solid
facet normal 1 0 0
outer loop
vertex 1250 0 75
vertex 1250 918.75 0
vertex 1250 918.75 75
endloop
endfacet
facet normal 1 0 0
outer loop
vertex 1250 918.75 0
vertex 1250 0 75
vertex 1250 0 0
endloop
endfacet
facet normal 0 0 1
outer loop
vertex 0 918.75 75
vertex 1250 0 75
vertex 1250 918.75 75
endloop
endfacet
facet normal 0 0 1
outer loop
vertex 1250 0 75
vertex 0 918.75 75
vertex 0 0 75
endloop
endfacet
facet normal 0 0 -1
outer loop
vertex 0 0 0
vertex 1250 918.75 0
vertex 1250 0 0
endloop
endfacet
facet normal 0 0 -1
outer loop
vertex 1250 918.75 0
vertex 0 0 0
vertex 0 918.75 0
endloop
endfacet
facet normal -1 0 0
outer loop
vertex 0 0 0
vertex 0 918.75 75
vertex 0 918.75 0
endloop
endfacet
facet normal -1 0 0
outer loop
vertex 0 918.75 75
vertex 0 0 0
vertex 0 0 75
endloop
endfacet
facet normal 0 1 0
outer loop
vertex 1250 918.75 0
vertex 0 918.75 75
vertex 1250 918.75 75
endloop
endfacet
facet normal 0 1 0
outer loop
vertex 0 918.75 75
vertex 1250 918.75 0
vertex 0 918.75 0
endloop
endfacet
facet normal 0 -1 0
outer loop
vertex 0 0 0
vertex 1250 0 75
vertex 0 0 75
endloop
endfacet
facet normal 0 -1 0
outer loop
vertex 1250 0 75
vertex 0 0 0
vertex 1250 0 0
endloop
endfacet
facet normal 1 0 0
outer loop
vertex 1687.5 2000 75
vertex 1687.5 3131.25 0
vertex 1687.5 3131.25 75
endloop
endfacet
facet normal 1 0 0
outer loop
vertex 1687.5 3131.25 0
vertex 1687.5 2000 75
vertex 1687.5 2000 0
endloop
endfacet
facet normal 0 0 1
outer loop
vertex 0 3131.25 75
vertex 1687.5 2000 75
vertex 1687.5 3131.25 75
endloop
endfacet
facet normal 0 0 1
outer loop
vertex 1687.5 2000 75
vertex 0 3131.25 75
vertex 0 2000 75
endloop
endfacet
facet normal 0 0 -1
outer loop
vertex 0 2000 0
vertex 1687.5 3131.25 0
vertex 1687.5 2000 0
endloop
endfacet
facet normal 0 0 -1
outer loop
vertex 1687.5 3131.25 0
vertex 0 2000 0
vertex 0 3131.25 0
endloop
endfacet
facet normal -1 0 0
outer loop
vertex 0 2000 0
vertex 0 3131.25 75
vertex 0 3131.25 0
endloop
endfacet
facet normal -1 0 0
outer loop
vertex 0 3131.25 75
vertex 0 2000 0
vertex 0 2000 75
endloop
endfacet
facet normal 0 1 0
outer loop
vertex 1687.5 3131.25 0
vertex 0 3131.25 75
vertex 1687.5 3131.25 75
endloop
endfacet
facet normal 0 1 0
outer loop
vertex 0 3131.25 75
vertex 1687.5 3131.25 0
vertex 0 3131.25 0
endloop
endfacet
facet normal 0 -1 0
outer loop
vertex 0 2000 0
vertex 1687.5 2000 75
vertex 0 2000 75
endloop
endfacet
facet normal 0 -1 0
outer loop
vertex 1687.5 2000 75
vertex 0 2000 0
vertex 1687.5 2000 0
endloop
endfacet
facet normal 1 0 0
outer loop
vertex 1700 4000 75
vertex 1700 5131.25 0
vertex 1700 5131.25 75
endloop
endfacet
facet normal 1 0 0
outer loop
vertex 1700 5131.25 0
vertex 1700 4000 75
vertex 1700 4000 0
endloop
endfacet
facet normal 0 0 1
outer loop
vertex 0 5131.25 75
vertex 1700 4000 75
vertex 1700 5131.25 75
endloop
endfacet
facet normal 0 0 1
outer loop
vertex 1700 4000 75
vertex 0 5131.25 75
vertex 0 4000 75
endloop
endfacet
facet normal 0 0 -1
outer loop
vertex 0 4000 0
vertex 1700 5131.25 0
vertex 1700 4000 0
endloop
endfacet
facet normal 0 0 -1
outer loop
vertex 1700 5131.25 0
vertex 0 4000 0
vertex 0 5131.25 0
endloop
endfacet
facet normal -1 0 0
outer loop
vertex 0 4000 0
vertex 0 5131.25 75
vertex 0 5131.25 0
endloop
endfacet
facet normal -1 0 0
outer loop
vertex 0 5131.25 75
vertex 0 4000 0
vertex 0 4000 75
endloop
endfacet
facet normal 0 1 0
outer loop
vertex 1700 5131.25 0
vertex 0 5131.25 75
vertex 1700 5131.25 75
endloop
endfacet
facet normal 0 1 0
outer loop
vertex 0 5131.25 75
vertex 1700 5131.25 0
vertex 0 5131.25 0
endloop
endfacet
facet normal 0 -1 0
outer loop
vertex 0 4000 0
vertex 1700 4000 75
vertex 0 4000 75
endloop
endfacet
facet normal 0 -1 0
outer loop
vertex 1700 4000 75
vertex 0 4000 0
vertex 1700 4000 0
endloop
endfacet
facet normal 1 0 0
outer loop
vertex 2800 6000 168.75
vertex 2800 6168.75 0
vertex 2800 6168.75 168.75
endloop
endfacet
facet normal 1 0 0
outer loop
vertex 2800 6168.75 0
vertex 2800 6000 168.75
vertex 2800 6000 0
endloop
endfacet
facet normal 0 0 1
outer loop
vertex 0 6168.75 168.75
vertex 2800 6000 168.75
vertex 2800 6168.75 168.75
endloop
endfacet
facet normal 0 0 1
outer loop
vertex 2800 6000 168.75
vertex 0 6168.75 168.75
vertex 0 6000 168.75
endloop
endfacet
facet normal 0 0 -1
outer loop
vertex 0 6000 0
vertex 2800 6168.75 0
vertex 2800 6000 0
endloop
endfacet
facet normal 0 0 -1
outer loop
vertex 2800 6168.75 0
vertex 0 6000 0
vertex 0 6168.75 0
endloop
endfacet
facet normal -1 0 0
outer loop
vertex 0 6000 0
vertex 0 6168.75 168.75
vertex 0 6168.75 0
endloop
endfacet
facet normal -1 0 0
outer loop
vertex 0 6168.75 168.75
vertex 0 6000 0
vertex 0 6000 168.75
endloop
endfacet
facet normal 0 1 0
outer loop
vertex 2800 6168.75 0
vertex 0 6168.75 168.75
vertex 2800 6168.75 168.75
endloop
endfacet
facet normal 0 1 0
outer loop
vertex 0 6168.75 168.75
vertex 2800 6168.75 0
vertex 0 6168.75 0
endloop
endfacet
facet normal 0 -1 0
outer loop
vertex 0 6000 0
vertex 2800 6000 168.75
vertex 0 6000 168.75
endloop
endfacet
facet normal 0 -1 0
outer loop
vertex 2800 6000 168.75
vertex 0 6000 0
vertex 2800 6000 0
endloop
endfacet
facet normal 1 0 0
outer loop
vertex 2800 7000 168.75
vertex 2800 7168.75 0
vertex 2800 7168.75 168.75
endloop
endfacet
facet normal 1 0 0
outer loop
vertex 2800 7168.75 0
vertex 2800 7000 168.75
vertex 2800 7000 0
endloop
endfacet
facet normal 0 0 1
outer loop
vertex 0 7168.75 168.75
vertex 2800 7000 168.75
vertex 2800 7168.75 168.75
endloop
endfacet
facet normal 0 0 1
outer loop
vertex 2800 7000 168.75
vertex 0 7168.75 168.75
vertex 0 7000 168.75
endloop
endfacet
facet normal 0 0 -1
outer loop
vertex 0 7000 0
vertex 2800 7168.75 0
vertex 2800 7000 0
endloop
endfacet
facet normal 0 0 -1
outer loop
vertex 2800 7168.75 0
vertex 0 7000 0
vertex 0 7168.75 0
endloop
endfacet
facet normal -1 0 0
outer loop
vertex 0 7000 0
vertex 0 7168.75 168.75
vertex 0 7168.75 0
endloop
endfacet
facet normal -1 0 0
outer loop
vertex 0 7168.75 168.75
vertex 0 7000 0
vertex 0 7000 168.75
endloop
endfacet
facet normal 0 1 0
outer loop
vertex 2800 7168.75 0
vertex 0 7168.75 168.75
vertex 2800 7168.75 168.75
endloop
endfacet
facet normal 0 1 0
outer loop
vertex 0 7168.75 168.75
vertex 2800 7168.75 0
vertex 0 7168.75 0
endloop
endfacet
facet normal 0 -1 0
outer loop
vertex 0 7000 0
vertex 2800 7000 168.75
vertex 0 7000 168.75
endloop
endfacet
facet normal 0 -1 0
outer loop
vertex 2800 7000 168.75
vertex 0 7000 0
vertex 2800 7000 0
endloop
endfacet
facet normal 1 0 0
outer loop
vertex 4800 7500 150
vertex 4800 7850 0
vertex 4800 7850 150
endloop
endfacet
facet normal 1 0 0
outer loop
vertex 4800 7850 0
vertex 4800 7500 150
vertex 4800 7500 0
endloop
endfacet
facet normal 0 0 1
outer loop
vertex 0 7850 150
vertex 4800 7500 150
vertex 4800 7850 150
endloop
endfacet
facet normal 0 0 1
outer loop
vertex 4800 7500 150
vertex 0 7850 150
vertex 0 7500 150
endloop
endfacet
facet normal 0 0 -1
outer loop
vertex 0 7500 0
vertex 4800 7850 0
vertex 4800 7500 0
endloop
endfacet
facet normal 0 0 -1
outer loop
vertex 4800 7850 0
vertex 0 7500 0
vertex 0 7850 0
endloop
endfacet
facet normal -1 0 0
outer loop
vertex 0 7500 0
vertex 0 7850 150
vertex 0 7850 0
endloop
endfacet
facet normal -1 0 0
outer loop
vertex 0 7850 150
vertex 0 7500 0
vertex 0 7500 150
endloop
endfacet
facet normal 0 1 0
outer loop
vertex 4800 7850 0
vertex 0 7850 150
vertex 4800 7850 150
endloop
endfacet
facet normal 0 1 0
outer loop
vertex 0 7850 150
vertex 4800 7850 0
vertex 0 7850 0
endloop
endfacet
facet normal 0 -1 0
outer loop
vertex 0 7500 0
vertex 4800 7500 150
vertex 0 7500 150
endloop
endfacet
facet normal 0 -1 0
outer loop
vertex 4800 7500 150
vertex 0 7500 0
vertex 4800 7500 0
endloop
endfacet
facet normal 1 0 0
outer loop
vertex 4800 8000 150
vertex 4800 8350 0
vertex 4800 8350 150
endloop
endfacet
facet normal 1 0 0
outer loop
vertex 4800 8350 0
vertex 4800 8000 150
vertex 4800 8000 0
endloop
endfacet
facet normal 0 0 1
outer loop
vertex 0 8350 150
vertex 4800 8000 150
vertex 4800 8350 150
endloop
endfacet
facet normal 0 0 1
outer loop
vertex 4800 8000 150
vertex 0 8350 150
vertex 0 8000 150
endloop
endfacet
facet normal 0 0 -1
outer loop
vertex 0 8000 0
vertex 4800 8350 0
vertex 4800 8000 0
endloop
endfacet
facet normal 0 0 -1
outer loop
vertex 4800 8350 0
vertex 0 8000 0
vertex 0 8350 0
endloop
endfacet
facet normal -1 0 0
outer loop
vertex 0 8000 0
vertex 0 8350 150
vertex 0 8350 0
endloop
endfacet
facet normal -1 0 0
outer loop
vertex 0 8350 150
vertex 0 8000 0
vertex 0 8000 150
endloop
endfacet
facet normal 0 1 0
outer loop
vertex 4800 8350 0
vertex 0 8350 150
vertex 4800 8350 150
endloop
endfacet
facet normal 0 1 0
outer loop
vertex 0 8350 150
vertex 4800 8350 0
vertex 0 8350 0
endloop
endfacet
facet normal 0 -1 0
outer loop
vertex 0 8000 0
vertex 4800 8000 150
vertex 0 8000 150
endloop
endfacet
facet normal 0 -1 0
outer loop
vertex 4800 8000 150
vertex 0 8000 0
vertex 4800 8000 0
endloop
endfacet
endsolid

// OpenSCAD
function i2u(i,o16) = i * 100 + o16 * 100 / 16;

module icube(w1,w2,d1,d2,h1,h2){
	color([150/255, 111/255, 51/255, 0.5])
	cube([i2u(w1,w2),
			i2u(d1,d2),
			i2u(h1,h2)]);
}

module smallThinBoard(){
	icube(12,8,
			9,3,
			0,12);
}


module medThinBoard(){
	icube(16,14,
			11,5,
			0,12);
}


module largeThinBoard(){
	icube(17,0,
			11,5,
			0,12);
}


module rawLeg(){
	icube(28,0,
			1,11,
			1,11);
}


module rawLongBoard(){
	icube(48,0,
			3,8,
			1,8);
}


smallThinBoard();
translate([0,2000,0]) medThinBoard();
translate([0,4000,0]) largeThinBoard();
translate([0,6000,0]) rawLeg();
translate([0,7000,0]) rawLeg();
translate([0,7500,0]) rawLongBoard();
translate([0,8000,0]) rawLongBoard();
